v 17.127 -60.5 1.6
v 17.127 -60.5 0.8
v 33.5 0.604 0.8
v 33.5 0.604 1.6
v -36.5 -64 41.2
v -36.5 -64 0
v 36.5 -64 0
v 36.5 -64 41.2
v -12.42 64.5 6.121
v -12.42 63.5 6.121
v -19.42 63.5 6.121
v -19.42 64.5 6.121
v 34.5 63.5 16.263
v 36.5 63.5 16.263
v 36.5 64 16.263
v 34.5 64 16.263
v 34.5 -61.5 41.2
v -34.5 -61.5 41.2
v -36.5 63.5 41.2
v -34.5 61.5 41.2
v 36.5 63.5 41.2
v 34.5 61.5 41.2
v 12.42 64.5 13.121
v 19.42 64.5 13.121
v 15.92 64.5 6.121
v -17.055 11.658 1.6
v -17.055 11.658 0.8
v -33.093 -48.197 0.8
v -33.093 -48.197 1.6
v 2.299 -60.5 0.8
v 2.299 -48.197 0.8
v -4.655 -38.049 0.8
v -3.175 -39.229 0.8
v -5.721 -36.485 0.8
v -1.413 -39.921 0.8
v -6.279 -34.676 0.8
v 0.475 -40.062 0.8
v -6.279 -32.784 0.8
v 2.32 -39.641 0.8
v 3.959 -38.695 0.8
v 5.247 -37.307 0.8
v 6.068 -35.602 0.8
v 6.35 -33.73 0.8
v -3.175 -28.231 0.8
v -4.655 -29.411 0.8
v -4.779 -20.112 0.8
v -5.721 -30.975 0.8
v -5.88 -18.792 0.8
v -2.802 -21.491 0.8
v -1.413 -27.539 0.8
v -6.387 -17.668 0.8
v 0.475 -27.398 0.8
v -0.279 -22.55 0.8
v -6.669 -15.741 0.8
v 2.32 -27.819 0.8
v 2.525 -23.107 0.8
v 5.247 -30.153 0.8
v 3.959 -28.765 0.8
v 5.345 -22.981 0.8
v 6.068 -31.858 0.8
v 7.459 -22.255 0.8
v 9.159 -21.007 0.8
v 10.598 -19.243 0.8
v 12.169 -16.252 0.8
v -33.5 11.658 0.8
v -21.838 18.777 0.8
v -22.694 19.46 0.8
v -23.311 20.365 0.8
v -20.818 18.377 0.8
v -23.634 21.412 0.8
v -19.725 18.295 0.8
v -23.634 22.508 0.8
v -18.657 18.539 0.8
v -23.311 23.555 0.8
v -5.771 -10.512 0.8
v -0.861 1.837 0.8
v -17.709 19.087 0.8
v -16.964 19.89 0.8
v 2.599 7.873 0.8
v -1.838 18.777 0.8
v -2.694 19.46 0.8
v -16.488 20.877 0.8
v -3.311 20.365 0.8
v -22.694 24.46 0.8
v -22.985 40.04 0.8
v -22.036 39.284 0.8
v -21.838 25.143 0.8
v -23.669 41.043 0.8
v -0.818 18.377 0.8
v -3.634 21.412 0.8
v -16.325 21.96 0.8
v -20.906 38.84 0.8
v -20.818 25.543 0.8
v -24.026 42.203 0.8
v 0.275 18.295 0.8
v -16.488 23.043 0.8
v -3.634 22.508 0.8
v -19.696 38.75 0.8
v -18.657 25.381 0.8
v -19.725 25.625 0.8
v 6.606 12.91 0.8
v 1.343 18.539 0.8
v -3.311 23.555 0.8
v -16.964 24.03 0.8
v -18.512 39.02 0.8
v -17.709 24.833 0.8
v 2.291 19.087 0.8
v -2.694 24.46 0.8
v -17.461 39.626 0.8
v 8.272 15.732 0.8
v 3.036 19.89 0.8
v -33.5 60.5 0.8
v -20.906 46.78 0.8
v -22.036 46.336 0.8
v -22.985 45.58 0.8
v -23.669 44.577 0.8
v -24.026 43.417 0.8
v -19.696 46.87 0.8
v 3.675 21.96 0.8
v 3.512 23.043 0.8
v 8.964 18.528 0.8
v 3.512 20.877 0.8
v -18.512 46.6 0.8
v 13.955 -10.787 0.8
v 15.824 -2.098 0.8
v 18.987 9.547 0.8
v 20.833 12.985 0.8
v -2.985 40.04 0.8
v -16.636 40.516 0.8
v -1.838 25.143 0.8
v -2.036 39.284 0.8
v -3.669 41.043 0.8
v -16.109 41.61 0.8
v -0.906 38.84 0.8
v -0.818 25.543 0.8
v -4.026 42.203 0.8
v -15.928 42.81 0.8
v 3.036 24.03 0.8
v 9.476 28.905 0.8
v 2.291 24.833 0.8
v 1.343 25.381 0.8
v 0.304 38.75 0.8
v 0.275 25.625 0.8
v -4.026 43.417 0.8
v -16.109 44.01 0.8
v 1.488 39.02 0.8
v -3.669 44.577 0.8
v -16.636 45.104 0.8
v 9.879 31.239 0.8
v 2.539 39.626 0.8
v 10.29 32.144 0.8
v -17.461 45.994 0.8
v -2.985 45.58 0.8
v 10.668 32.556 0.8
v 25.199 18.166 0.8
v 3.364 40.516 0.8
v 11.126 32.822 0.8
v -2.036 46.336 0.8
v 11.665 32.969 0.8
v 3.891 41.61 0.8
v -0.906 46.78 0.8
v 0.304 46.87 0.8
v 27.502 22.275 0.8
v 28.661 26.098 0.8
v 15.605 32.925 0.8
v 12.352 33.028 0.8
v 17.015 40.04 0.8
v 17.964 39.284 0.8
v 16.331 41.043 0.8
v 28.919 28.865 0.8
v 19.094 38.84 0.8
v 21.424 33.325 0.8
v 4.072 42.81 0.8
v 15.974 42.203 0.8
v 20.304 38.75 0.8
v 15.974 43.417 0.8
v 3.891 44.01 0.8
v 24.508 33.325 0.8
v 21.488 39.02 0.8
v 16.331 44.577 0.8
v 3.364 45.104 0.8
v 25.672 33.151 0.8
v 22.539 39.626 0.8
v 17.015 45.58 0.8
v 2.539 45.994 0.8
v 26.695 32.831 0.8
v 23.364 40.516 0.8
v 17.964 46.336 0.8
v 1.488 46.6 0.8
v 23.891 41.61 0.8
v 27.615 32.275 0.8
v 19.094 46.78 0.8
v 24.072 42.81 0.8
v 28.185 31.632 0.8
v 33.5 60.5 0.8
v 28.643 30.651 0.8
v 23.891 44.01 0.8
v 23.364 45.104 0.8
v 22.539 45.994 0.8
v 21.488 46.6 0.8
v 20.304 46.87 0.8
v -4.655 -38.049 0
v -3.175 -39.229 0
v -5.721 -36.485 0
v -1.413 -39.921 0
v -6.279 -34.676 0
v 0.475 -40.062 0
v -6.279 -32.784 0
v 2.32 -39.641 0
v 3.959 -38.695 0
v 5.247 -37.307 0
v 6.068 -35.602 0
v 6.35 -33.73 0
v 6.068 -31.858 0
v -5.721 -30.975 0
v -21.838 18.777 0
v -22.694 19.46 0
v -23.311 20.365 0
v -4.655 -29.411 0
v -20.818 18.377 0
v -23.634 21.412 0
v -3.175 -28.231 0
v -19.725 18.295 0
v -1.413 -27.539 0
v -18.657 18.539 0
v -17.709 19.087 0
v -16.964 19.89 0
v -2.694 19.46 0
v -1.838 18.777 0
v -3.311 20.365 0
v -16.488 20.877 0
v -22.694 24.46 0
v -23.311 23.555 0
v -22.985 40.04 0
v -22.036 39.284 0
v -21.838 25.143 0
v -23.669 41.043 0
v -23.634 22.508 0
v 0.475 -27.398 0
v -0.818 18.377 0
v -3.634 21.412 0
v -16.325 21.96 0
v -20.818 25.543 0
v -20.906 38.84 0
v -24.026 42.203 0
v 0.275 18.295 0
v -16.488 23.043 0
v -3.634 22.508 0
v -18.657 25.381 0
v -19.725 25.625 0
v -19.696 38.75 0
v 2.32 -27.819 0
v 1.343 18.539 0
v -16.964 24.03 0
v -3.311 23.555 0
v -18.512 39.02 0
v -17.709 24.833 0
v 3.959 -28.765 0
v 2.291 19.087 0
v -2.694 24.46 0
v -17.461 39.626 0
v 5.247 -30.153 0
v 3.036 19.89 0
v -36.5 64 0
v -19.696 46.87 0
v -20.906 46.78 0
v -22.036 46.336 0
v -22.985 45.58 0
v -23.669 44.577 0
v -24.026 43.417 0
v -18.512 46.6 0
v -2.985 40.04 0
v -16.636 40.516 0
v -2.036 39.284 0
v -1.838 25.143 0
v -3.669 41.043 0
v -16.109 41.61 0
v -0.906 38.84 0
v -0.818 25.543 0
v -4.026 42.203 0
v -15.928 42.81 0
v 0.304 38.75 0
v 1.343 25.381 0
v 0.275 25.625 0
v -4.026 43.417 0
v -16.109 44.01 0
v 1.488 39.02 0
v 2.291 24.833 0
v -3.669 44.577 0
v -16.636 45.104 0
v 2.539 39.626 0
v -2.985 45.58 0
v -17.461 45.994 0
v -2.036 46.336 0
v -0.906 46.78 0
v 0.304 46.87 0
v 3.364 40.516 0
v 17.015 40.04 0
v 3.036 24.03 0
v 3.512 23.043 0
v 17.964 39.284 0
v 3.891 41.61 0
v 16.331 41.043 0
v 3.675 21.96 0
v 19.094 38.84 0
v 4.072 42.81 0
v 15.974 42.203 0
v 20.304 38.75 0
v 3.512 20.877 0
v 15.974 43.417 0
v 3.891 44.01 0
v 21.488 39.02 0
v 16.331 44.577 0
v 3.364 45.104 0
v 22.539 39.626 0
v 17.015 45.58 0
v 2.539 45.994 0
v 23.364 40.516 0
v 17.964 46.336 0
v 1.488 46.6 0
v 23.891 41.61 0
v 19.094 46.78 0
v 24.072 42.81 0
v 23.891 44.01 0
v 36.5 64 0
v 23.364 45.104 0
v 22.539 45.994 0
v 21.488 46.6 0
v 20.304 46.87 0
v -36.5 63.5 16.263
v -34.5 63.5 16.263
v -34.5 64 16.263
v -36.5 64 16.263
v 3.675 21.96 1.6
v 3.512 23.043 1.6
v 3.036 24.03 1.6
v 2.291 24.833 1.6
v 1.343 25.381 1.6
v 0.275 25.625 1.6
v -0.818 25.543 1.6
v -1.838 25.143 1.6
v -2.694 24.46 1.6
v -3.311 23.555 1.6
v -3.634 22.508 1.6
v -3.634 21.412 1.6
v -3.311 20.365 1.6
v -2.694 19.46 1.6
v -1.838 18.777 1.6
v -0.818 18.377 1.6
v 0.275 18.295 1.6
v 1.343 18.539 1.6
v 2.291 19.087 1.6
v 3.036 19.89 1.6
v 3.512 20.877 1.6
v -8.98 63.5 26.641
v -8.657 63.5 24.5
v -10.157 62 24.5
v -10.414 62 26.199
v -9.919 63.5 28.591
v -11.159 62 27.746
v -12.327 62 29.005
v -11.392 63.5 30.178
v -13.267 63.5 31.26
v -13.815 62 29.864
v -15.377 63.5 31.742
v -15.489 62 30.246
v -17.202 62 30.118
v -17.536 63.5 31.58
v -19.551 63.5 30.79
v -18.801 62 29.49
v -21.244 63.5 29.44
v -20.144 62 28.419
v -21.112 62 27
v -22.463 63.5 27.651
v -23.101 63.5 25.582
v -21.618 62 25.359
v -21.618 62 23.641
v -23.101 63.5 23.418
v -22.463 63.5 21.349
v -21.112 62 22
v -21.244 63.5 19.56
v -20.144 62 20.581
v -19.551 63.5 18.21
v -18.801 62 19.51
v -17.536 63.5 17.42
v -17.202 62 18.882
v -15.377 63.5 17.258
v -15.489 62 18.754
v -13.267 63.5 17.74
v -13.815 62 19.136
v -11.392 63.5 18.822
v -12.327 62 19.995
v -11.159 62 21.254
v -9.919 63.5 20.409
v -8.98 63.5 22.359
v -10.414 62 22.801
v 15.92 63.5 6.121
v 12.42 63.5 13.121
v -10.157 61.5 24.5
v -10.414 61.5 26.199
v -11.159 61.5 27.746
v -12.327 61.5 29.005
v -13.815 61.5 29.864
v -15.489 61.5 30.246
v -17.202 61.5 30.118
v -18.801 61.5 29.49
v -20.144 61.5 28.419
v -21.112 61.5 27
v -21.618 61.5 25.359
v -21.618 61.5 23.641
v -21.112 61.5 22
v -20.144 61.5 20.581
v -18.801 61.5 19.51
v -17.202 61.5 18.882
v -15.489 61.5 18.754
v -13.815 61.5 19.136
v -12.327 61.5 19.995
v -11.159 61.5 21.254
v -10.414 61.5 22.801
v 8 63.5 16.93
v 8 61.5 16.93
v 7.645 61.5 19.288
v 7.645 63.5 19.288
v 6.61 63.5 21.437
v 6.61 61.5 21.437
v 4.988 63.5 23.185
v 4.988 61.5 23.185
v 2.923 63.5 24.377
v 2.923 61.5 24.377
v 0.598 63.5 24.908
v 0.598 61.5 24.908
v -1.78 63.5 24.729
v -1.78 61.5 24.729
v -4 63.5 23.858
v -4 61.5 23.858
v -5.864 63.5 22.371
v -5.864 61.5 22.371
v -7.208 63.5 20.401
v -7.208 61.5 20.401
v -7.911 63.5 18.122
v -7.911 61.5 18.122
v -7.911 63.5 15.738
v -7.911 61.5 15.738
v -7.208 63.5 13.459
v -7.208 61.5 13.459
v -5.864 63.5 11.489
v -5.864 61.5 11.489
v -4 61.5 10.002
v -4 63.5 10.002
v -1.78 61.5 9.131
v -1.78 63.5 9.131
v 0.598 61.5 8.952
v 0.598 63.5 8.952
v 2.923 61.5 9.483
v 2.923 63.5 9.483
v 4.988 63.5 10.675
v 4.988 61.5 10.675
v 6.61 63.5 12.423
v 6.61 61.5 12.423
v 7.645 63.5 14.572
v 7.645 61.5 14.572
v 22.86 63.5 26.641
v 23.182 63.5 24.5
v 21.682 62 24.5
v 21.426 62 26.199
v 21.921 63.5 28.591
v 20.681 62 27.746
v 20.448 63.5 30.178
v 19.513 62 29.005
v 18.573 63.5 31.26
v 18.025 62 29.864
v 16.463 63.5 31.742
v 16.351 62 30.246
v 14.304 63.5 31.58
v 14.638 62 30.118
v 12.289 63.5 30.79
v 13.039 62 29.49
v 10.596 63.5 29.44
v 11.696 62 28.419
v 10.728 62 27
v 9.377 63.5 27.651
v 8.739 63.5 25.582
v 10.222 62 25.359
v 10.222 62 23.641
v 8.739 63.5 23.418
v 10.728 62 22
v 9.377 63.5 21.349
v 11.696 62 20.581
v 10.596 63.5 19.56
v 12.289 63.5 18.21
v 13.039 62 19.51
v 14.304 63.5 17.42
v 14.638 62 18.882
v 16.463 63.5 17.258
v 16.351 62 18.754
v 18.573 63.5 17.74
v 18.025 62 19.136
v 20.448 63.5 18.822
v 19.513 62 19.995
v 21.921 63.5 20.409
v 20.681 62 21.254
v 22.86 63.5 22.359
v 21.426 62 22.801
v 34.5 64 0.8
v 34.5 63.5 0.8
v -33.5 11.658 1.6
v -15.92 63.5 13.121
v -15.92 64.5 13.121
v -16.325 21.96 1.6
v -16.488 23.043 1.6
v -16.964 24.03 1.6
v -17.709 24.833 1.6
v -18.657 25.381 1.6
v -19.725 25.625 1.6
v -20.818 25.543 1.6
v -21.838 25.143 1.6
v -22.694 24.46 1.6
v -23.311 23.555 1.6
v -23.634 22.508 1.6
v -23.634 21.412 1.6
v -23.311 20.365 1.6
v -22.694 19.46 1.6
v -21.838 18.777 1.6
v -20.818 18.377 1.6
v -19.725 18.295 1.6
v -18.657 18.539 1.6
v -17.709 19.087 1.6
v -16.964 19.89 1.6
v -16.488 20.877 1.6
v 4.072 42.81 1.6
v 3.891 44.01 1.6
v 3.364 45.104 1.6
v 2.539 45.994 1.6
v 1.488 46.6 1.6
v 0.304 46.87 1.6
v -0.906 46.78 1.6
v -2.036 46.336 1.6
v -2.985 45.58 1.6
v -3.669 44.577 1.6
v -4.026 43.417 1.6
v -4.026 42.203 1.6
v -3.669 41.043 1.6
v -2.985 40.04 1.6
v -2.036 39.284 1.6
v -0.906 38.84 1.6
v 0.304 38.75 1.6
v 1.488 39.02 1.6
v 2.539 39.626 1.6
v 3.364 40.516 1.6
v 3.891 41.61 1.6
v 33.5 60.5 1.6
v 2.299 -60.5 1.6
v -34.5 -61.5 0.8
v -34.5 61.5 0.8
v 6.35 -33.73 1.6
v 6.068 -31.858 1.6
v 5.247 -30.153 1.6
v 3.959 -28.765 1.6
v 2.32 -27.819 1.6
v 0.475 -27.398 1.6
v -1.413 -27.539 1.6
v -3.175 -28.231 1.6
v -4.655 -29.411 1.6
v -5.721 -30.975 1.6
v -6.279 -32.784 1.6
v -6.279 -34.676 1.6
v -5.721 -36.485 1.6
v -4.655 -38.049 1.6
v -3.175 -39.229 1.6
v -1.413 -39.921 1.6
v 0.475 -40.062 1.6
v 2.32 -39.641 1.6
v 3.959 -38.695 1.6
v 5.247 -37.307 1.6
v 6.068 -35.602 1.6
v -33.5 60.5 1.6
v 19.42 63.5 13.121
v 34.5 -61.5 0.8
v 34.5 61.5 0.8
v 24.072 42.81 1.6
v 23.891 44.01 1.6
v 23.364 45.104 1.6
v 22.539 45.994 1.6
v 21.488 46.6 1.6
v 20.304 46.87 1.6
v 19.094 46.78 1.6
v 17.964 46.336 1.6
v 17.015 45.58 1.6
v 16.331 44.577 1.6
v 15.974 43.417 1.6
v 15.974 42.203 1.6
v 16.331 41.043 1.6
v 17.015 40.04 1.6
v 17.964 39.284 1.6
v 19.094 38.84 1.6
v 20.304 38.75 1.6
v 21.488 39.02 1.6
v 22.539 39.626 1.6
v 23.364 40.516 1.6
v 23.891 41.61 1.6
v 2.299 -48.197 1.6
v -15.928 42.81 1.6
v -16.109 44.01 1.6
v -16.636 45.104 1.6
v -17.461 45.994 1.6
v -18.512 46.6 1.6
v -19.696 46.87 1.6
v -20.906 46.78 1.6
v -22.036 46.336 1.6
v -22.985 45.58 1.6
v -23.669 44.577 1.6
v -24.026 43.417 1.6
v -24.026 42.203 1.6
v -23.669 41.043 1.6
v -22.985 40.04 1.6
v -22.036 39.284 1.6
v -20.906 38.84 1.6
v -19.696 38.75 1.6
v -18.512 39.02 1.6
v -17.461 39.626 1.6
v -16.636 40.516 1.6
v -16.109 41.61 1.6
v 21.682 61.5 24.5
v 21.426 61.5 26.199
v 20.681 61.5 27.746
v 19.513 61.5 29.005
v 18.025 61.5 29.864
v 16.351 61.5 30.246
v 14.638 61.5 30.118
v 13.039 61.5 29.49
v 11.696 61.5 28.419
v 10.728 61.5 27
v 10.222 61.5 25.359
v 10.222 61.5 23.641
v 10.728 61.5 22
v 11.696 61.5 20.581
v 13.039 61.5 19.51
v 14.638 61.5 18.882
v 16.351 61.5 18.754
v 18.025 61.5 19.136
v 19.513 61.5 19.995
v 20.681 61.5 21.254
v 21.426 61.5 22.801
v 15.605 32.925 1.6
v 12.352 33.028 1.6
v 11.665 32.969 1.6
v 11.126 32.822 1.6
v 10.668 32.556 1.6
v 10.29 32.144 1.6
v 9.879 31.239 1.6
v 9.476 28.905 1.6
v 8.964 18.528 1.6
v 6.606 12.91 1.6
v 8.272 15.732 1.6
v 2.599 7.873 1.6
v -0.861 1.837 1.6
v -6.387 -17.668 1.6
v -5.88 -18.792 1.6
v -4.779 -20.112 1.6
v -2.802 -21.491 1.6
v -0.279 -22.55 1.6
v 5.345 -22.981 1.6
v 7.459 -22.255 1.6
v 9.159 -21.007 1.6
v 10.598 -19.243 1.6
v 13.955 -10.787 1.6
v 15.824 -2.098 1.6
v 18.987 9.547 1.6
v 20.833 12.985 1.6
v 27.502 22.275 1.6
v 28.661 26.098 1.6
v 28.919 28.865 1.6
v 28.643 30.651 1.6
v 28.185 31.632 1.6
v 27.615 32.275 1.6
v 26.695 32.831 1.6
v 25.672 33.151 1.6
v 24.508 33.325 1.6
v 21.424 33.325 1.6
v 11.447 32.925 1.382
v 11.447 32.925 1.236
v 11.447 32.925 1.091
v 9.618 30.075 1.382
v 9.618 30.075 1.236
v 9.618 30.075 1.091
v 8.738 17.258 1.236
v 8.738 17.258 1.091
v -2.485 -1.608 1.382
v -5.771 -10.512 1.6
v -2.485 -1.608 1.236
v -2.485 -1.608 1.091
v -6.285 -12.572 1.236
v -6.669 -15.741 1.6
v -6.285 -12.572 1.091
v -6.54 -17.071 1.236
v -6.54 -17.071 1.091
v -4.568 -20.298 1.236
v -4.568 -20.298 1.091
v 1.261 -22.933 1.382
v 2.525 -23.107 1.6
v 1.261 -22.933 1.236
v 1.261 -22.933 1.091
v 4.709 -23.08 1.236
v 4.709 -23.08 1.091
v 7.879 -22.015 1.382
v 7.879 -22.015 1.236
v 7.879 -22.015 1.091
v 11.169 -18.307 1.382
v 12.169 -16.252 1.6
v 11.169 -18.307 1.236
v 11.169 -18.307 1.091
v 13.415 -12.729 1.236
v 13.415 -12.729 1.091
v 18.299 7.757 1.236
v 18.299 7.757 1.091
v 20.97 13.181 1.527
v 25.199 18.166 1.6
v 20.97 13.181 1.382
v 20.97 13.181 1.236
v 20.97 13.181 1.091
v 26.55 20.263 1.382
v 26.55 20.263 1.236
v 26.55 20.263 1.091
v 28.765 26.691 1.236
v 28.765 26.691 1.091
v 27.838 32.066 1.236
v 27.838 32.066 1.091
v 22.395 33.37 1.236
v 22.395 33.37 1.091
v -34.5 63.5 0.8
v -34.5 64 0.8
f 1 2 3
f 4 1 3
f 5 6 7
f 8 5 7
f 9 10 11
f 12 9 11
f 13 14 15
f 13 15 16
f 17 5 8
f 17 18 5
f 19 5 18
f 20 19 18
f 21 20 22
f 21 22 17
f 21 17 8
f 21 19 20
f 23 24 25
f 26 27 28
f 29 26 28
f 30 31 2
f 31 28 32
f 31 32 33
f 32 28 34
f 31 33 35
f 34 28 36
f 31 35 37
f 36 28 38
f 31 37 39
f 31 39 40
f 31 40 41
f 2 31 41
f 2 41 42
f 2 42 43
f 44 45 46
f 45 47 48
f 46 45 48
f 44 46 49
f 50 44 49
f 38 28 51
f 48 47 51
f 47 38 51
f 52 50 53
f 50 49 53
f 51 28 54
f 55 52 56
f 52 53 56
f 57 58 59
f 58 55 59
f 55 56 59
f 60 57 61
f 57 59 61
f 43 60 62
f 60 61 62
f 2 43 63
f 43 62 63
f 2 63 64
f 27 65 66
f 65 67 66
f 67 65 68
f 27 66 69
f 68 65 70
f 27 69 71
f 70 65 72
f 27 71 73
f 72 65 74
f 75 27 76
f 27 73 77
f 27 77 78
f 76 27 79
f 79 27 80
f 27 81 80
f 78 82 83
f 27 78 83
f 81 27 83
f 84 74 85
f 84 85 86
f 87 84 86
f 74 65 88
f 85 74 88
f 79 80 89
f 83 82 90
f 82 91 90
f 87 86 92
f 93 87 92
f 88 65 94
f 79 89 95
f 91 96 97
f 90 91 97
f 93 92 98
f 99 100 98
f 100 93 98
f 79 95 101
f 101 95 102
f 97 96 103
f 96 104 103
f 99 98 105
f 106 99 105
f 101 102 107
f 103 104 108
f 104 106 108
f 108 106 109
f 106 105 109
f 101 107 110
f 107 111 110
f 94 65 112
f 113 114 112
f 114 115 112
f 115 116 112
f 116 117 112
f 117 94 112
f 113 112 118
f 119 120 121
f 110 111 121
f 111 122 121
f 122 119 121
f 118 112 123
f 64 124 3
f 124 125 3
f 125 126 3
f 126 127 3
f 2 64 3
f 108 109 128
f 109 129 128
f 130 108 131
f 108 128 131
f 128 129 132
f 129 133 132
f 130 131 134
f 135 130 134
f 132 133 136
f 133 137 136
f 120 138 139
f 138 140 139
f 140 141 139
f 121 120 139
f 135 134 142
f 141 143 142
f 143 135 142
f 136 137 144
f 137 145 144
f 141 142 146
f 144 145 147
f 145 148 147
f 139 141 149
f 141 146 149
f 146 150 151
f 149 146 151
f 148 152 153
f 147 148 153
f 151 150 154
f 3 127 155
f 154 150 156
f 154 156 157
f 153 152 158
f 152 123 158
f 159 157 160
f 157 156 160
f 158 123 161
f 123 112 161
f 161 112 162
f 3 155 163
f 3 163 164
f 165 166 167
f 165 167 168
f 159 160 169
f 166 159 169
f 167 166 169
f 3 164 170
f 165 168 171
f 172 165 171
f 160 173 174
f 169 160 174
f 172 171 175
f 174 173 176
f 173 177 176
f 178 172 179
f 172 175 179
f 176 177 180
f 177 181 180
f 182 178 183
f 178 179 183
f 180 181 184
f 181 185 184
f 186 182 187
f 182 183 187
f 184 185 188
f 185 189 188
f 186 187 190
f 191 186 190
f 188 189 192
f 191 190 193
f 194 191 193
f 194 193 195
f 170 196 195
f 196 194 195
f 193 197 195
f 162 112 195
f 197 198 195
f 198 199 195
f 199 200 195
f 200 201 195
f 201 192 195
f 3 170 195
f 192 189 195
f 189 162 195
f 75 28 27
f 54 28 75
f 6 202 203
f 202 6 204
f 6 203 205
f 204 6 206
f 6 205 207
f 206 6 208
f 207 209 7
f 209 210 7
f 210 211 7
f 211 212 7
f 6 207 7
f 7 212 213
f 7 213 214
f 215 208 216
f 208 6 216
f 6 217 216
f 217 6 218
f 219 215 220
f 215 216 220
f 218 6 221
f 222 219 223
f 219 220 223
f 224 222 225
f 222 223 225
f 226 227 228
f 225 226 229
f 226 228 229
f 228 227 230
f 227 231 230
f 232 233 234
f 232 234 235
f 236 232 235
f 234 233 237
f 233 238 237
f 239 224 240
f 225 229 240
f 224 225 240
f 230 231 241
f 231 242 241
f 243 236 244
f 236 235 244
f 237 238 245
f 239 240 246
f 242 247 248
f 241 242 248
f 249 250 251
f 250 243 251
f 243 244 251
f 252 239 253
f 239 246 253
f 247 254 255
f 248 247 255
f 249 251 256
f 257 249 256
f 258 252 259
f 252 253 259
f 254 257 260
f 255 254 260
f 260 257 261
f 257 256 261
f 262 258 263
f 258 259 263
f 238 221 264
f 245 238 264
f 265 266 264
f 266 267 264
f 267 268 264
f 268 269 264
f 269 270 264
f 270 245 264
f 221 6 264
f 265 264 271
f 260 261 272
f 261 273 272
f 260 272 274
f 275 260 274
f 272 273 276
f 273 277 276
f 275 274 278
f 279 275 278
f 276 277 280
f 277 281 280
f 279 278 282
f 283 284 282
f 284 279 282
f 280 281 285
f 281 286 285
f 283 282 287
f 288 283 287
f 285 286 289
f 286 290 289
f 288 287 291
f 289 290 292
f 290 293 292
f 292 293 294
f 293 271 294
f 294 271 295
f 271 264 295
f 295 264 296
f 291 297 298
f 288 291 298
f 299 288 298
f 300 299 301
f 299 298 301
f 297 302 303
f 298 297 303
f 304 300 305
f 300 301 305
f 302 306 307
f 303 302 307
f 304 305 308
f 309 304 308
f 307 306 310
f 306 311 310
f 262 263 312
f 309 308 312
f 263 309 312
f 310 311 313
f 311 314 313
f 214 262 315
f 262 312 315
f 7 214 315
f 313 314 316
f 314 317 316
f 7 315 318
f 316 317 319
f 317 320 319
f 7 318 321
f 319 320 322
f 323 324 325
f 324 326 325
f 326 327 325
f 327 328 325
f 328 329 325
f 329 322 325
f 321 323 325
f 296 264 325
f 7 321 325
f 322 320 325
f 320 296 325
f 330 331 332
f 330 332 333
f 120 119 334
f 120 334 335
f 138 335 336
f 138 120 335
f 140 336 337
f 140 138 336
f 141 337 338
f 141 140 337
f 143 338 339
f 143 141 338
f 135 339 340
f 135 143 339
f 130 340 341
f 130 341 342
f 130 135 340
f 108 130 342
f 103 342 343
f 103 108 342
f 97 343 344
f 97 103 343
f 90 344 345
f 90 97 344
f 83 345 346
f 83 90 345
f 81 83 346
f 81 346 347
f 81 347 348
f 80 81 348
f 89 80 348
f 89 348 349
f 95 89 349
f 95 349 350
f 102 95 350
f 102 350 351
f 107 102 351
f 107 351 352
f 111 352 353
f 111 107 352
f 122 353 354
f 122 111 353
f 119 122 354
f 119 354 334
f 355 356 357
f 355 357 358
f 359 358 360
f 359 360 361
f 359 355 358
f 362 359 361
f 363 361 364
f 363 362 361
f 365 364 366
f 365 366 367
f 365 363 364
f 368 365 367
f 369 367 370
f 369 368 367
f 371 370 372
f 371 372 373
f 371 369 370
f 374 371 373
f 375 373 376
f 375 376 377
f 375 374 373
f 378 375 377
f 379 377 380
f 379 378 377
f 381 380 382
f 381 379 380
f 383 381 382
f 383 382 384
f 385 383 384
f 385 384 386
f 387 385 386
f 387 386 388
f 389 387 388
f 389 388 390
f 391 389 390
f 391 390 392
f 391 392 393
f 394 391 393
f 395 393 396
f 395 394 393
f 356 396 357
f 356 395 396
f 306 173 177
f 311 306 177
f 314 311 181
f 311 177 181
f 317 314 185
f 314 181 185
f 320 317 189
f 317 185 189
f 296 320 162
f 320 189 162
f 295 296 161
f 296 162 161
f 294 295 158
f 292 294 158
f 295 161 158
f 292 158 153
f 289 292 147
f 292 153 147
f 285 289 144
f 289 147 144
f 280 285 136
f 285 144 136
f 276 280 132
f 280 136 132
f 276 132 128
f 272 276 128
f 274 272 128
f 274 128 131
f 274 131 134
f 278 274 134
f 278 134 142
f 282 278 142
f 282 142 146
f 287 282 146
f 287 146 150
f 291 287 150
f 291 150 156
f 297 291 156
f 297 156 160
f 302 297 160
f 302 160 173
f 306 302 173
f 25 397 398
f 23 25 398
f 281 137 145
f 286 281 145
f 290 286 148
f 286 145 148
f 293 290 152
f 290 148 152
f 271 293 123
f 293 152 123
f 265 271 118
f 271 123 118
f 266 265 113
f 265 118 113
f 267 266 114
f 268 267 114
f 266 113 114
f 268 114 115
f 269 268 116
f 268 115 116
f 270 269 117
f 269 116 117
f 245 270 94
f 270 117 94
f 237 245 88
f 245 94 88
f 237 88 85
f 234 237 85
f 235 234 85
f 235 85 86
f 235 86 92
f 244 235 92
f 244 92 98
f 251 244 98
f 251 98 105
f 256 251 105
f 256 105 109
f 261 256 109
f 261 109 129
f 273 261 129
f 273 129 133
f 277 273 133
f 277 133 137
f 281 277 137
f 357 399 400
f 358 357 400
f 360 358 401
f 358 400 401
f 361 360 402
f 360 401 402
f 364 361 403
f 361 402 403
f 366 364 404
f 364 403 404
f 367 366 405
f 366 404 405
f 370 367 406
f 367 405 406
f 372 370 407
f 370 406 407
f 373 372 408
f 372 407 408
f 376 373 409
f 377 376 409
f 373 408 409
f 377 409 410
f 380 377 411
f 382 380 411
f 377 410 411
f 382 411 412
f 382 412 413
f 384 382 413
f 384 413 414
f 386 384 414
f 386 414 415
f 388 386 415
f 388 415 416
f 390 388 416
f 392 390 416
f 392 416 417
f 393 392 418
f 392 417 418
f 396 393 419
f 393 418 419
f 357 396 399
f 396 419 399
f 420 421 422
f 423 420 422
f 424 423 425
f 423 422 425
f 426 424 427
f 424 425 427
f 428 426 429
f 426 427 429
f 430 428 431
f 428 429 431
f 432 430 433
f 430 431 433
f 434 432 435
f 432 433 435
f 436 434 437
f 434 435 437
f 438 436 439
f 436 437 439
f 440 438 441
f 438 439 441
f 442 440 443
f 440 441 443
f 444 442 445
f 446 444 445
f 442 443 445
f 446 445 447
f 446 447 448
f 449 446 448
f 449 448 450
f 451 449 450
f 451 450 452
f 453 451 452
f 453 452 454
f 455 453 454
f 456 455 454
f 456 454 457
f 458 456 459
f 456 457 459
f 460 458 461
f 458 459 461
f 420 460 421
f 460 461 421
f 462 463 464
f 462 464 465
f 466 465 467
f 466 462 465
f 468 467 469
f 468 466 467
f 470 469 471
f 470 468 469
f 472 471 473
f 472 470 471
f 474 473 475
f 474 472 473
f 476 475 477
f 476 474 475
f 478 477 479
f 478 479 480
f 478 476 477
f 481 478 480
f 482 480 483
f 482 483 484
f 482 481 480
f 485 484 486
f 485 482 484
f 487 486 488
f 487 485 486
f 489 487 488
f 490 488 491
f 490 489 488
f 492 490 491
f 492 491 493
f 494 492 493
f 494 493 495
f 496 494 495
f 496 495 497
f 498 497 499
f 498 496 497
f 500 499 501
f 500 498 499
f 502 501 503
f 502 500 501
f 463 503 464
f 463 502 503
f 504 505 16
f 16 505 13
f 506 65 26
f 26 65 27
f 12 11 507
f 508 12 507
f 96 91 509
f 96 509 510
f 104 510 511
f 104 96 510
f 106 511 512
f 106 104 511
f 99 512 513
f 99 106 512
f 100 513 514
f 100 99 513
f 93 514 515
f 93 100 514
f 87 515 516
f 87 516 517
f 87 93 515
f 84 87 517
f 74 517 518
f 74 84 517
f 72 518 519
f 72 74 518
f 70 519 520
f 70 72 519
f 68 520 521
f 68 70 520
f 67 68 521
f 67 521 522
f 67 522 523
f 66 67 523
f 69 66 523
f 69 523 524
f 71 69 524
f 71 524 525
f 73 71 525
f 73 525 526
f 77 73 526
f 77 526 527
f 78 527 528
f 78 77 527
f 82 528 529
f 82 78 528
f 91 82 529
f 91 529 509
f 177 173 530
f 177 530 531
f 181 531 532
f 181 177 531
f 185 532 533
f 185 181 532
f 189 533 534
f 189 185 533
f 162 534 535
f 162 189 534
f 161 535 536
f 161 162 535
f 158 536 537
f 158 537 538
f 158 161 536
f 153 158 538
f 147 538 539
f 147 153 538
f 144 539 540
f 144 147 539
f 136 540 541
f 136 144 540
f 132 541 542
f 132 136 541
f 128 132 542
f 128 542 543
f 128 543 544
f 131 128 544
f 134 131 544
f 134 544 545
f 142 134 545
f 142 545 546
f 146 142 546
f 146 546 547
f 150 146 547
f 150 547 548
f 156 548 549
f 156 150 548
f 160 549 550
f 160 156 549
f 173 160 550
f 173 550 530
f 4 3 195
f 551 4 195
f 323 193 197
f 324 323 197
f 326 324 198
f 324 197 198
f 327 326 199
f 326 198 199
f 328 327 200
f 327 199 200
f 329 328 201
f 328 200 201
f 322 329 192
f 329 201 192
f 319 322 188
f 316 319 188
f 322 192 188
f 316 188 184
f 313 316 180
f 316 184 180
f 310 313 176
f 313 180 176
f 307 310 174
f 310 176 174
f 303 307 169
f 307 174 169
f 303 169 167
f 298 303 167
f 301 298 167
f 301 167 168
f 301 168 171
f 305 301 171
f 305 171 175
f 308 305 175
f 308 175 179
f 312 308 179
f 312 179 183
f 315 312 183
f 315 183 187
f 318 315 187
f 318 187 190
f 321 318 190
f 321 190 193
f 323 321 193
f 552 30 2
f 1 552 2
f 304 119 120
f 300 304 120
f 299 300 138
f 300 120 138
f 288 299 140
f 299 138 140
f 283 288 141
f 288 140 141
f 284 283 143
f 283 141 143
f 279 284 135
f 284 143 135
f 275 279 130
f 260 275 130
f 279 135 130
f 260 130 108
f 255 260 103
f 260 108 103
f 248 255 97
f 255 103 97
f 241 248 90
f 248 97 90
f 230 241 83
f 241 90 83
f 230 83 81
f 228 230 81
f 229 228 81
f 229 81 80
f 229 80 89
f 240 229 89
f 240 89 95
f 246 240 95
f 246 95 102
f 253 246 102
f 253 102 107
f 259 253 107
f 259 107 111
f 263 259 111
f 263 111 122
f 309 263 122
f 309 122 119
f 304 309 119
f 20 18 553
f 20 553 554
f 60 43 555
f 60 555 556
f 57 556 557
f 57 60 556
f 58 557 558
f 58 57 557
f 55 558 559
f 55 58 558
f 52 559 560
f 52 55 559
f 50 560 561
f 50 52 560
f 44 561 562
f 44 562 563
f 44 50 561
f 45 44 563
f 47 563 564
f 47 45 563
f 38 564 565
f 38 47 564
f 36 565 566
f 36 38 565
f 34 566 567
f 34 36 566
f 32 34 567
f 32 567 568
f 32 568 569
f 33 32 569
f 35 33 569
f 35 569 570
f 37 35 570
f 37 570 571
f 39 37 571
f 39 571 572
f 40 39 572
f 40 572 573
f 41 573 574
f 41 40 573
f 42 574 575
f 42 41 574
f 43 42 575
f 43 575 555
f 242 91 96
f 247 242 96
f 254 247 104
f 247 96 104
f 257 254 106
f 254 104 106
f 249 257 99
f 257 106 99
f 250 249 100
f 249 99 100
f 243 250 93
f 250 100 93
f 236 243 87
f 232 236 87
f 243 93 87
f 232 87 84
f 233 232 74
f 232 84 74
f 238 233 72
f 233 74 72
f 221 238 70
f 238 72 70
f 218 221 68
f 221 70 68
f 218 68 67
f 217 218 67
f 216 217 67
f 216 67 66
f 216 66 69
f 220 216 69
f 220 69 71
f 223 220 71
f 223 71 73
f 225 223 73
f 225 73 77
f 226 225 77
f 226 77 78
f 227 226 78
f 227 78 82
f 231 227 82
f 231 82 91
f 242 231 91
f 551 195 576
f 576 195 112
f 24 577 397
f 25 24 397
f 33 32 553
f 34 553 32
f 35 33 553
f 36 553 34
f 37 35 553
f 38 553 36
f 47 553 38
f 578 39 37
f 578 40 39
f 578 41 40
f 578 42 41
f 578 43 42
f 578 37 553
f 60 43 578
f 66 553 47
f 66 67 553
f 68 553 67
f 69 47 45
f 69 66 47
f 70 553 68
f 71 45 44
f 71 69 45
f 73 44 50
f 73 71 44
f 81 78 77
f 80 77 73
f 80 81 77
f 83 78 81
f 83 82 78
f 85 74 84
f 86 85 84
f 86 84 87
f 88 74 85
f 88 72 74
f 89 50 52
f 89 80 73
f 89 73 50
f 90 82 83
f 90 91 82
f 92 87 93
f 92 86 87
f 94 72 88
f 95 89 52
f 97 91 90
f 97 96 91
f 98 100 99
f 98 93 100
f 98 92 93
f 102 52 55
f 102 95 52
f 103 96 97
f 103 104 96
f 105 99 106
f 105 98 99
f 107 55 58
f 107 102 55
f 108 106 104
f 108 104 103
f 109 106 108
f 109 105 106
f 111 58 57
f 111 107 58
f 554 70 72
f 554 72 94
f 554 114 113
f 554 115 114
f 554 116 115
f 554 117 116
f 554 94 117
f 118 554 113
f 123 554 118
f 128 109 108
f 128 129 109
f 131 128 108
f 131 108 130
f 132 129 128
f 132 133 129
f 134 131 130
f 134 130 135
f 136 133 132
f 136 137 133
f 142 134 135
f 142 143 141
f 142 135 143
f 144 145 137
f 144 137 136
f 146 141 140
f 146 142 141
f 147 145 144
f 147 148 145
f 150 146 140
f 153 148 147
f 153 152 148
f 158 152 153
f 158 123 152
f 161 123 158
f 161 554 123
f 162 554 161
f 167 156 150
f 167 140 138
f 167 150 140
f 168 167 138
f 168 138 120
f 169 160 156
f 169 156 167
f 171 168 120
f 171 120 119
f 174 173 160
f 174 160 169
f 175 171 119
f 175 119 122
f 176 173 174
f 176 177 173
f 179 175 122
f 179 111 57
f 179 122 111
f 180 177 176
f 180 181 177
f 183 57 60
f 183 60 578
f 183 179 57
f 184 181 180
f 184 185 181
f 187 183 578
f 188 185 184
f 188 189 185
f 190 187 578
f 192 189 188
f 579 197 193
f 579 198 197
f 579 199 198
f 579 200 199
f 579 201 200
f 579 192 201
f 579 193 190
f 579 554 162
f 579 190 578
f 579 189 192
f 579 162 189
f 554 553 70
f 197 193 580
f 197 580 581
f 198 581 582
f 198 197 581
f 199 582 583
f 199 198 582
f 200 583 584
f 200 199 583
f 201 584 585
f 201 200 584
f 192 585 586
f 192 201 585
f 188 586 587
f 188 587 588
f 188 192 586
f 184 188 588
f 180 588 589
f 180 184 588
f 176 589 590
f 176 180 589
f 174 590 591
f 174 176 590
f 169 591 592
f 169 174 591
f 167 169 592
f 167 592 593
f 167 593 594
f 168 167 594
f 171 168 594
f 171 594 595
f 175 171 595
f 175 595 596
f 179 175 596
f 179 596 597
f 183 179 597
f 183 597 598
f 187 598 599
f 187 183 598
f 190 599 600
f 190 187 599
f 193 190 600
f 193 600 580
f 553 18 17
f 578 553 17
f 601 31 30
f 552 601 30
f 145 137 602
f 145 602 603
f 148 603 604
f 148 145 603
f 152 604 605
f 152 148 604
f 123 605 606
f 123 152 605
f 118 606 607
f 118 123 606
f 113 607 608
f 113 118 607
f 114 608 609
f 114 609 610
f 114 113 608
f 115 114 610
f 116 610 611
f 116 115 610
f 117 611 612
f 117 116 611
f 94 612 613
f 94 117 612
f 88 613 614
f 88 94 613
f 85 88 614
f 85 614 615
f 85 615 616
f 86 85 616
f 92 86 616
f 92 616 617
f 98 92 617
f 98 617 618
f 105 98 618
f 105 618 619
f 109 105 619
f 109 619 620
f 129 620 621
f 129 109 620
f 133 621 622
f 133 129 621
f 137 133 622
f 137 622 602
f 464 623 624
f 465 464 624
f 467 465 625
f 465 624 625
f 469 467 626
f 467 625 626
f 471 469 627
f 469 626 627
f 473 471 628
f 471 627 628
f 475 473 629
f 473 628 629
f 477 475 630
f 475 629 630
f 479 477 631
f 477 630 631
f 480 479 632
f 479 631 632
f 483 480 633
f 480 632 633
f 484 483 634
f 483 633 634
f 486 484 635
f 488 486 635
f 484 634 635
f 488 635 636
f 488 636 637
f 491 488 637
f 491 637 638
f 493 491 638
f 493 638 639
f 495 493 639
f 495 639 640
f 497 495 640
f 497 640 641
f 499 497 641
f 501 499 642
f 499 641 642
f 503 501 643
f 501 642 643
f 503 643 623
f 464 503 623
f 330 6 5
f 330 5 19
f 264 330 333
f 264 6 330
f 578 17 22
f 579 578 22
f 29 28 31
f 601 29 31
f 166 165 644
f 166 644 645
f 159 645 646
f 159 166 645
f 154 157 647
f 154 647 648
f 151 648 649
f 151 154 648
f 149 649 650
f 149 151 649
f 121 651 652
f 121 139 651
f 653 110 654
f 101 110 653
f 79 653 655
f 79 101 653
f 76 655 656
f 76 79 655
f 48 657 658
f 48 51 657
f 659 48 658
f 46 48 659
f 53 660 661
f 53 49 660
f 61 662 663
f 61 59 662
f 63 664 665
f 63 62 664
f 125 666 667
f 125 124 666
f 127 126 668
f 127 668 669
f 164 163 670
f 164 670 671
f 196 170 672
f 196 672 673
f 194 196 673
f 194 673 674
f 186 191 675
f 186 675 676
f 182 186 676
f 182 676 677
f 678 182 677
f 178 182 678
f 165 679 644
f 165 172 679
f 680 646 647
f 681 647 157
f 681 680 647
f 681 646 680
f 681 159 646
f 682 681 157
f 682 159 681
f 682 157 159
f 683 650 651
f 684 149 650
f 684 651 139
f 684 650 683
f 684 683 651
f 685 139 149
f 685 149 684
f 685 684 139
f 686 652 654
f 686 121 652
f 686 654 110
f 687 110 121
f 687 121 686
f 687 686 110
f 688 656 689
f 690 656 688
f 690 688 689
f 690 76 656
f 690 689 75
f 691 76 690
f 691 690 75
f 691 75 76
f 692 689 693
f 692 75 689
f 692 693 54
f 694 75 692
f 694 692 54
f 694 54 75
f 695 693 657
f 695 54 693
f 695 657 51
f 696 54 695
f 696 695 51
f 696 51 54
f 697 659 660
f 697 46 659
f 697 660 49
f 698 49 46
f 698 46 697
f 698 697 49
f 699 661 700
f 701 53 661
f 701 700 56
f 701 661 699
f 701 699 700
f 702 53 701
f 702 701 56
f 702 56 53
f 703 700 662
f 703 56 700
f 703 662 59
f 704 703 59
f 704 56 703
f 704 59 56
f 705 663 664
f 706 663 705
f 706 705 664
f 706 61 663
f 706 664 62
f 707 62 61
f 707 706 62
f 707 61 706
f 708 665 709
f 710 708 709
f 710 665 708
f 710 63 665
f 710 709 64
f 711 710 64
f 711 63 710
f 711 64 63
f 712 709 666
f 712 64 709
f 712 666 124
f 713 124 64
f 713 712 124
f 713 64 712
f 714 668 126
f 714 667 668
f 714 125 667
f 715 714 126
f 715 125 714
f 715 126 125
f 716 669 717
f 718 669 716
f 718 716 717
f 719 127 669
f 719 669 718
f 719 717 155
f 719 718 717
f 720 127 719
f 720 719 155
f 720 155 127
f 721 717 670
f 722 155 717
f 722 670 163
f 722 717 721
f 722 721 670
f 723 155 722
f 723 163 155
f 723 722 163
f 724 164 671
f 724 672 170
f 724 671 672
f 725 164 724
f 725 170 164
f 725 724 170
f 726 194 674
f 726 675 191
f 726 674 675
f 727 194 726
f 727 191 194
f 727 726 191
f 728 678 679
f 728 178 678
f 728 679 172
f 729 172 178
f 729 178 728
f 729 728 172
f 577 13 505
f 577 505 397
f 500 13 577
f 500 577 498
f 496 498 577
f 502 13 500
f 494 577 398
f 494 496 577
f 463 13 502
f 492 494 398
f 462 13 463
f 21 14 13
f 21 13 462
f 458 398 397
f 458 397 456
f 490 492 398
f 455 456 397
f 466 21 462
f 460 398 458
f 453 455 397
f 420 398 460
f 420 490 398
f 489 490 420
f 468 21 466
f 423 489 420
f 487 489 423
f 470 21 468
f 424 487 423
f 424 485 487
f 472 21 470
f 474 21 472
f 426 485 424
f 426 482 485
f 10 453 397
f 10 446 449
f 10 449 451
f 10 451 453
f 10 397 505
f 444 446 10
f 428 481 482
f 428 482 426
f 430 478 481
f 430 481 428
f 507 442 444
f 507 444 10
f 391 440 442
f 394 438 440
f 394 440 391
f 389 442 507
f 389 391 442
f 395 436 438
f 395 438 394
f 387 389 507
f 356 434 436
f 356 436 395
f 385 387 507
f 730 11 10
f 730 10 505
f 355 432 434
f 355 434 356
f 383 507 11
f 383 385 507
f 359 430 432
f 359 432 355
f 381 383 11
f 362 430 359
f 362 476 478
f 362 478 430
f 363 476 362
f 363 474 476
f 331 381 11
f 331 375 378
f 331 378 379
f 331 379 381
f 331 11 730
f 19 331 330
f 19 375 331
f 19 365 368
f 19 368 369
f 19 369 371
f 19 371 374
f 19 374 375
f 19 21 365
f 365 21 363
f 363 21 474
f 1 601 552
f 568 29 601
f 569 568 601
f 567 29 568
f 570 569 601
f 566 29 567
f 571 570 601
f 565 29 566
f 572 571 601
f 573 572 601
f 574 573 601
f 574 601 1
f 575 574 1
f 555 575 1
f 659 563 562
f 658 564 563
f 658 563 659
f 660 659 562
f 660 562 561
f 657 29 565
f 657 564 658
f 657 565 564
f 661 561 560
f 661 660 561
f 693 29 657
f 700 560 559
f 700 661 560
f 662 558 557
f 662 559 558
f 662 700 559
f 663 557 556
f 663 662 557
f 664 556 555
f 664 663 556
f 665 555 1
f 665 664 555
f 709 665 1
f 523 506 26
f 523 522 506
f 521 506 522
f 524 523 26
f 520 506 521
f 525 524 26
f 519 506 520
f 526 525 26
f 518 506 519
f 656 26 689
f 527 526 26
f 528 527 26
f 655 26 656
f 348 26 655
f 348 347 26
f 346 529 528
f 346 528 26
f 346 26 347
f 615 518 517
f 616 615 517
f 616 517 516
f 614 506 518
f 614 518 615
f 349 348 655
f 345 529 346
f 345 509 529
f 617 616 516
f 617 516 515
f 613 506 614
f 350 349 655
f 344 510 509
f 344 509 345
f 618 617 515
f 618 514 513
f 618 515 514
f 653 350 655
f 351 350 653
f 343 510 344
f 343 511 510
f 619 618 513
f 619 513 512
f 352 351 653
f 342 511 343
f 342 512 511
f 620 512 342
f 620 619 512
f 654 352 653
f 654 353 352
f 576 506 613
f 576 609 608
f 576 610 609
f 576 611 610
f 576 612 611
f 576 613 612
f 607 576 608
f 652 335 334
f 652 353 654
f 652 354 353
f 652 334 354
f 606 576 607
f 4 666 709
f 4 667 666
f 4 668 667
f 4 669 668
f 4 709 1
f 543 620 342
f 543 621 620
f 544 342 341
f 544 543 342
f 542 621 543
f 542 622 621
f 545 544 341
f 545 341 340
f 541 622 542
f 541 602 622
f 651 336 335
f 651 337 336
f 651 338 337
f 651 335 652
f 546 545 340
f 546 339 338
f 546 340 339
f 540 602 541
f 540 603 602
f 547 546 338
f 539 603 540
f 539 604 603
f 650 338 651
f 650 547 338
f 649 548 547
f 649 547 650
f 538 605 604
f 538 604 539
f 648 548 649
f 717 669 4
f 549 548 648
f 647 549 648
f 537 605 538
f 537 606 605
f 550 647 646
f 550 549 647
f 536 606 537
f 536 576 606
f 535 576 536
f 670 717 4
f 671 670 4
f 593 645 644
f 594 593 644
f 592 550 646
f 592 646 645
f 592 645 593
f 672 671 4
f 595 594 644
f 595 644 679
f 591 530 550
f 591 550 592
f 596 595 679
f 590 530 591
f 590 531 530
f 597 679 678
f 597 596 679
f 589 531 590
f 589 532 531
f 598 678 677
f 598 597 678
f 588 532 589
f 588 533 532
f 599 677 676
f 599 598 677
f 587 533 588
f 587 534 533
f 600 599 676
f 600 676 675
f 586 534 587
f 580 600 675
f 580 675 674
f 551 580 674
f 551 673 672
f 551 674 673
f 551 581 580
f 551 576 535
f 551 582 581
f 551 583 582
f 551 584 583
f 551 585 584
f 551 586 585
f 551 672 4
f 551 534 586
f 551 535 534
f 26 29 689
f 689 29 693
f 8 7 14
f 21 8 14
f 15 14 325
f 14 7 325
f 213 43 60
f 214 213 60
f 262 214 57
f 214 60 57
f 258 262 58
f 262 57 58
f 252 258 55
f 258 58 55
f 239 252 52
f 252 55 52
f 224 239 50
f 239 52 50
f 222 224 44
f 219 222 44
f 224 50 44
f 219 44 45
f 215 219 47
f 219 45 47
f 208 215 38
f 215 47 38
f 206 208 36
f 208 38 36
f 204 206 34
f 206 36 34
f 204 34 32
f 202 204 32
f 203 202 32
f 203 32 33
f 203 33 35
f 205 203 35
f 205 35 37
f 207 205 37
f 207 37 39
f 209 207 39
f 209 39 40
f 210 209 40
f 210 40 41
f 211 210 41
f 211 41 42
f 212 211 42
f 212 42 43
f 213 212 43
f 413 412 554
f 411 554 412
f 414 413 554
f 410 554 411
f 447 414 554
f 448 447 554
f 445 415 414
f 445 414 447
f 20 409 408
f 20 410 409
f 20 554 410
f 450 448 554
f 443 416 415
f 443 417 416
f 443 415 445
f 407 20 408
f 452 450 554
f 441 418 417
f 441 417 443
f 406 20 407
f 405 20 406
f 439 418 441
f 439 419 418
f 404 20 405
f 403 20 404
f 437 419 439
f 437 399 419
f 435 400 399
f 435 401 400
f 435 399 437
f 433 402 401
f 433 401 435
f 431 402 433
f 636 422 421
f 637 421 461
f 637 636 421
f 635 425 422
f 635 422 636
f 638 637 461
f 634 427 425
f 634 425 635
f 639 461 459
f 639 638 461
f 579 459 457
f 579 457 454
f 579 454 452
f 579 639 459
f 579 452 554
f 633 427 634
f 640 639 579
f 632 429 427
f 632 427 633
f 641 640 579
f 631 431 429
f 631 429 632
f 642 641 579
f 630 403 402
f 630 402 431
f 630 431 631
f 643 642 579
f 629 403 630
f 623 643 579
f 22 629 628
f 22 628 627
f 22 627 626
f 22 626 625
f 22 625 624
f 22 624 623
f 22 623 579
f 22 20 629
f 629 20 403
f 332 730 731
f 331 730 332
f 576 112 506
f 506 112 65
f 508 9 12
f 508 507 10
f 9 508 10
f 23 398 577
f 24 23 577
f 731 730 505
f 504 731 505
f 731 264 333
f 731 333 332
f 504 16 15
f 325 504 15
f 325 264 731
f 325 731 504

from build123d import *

# Parameters (mm, degrees)
F0_W          = 73
F0_H          = 128
F1_DEPTH      = 41.2
F5_W          = 69
F5_H          = 123
F6_DEPTH      = 40.4
F6_DEPTH_BACK = 25
F7_R          = 4.071875
F7_R_2        = 6.35
F7_R_3        = 3.675
F8_DEPTH      = 25
F10_R         = 8
F10_R_2       = 5.7625
F11_DEPTH     = 15
F12_W         = 69
F12_H         = 42.2
F13_DEPTH     = 25
F14_W         = 150
F14_H         = 28.2408671558
F15_DEPTH     = 15
F16_SIZE      = 1.5
F18_DEPTH     = 1
F19_R         = 6.35
F19_R_2       = 3.675
F19_R_3       = 4.071875
F20_DEPTH     = 0.8
F22_W         = 123.770698905
F22_H         = 146.9892412424
F23_DEPTH     = 25


with BuildPart() as f1:
    # F0 (on Top) → F1 (new body)
    with BuildSketch(Plane.XY):
        Rectangle(F0_W, F0_H)
    extrude(amount=F1_DEPTH)

    # F5 (on offset) → F6 (cut, two sides)
    with BuildSketch(Plane.XY.offset(41.2)) as f6_sk:
        Rectangle(F5_W, F5_H)
    extrude(amount=-F6_DEPTH, mode=Mode.SUBTRACT)
    extrude(f6_sk.sketch, amount=F6_DEPTH_BACK, mode=Mode.SUBTRACT)

    # F7 (on face) → F8 (cut)
    with BuildSketch(Plane.XY.offset(0.8)):
        with Locations((-20, 42.81)):
            Circle(F7_R)
        with Locations((0, 42.81)):
            Circle(F7_R)
        with Locations((20, 42.81)):
            Circle(F7_R)
        with Locations((0, -33.73)):
            Circle(F7_R_2)
        with Locations((0, 21.96)):
            Circle(F7_R_3)
        with Locations((-20, 21.96)):
            Circle(F7_R_3)
    extrude(amount=-F8_DEPTH, mode=Mode.SUBTRACT)

    # F10 (on offset) → F11 (cut, symmetric)
    with BuildSketch(Plane.XZ.offset(-63.5)):
        with Locations((0, 16.93)):
            Circle(F10_R)
        with Locations((15.92, 24.5)):
            Circle(F10_R_2)
        with Locations((-15.92, 24.5)):
            Circle(F10_R_2)
    extrude(amount=F11_DEPTH, both=True, mode=Mode.SUBTRACT)

    # F12 (on offset) → F13 (cut)
    with BuildSketch(Plane.XZ.offset(-63.5)):
        with Locations((0, 21.9)):
            Rectangle(F12_W, F12_H)
    extrude(amount=-F13_DEPTH, mode=Mode.SUBTRACT)

    # F14 (on face) → F15 (cut)
    with BuildSketch(Plane(origin=(0, 63.5, 0), x_dir=(-1, 0, 0), z_dir=(0, 1, 0))):
        with Locations((0, 30.3829335779)):
            Rectangle(F14_W, F14_H)
    extrude(amount=F15_DEPTH, mode=Mode.SUBTRACT)

    # F16
    f16_edges = [f1.edges().sort_by_distance(p)[0] for p in [
        (-21.6825, 63.5, 24.5),
        (10.1575, 63.5, 24.5),
    ]]
    chamfer(f16_edges, length=F16_SIZE)

    # F17 (on face) → F18 (join)
    with BuildSketch(Plane(origin=(0, 63.5, 0), x_dir=(-1, 0, 0), z_dir=(0, 1, 0))):
        Polygon((-15.92, 13.1207361072), (-19.42, 13.1207361072), (-15.92, 6.1207361072), (-12.42, 13.1207361072), align=None)
        Polygon((19.42, 6.1207361072), (15.92, 13.1207361072), (12.42, 6.1207361072), (15.92, 6.1207361072), align=None)
    extrude(amount=F18_DEPTH)

    # F22 (on offset) → F23 (cut)
    with BuildSketch(Plane.XY.offset(41.2)):
        Rectangle(F22_W, F22_H)
    extrude(amount=F23_DEPTH, mode=Mode.SUBTRACT)


with BuildPart() as f20:
    # F19 (on face) → F20 (new body)
    with BuildSketch(Plane.XY.offset(0.8)):
        Polygon((33.5, 60.5), (-33.5, 60.5), (-33.5, 11.6581510395), (-17.0547928976, 11.6581510395), (-33.0930194505, -48.1973253191), (2.2994191386, -48.1973253191), (2.2994191386, -60.5), (17.1271677811, -60.5), (33.5, 0.6042417049), align=None)
        with Locations((0, -33.73)):
            Circle(F19_R, mode=Mode.SUBTRACT)
        with Locations((-20, 21.96)):
            Circle(F19_R_2, mode=Mode.SUBTRACT)
        with Locations((-20, 42.81)):
            Circle(F19_R_3, mode=Mode.SUBTRACT)
        with BuildLine():
            add(Edge.make_bspline(
                [(15.6051348895, 32.924618572), (12.9311973769, 32.9050587052), (8.1583206922, 34.4835221549), (10.5852890567, 15.1915361969), (2.2898659208, 10.0419387571), (-7.5230777911, -12.2370271299), (-6.4240600023, -21.293346284), (12.0416133573, -26.7494270075), (15.7498028651, 0.5879200412), (19.9682486356, 13.6247891199), (27.2742905516, 18.8212467612), (31.515846332, 35.761894196), (19.6221877874, 32.9540033349), (15.6051348895, 32.924618572)],
                knots=[0, 0, 0, 0, 0.0595949261, 0.1582299364, 0.240036439, 0.3633140055, 0.435238949, 0.5258654022, 0.6499418852, 0.7456055856, 0.8223737071, 0.9104706188, 1, 1, 1, 1], degree=3))
        make_face(mode=Mode.SUBTRACT)
        with Locations((0, 21.96)):
            Circle(F19_R_2, mode=Mode.SUBTRACT)
        with Locations((0, 42.81)):
            Circle(F19_R_3, mode=Mode.SUBTRACT)
        with Locations((20, 42.81)):
            Circle(F19_R_3, mode=Mode.SUBTRACT)
    extrude(amount=F20_DEPTH)


solid = Compound([f1.part, f20.part])
